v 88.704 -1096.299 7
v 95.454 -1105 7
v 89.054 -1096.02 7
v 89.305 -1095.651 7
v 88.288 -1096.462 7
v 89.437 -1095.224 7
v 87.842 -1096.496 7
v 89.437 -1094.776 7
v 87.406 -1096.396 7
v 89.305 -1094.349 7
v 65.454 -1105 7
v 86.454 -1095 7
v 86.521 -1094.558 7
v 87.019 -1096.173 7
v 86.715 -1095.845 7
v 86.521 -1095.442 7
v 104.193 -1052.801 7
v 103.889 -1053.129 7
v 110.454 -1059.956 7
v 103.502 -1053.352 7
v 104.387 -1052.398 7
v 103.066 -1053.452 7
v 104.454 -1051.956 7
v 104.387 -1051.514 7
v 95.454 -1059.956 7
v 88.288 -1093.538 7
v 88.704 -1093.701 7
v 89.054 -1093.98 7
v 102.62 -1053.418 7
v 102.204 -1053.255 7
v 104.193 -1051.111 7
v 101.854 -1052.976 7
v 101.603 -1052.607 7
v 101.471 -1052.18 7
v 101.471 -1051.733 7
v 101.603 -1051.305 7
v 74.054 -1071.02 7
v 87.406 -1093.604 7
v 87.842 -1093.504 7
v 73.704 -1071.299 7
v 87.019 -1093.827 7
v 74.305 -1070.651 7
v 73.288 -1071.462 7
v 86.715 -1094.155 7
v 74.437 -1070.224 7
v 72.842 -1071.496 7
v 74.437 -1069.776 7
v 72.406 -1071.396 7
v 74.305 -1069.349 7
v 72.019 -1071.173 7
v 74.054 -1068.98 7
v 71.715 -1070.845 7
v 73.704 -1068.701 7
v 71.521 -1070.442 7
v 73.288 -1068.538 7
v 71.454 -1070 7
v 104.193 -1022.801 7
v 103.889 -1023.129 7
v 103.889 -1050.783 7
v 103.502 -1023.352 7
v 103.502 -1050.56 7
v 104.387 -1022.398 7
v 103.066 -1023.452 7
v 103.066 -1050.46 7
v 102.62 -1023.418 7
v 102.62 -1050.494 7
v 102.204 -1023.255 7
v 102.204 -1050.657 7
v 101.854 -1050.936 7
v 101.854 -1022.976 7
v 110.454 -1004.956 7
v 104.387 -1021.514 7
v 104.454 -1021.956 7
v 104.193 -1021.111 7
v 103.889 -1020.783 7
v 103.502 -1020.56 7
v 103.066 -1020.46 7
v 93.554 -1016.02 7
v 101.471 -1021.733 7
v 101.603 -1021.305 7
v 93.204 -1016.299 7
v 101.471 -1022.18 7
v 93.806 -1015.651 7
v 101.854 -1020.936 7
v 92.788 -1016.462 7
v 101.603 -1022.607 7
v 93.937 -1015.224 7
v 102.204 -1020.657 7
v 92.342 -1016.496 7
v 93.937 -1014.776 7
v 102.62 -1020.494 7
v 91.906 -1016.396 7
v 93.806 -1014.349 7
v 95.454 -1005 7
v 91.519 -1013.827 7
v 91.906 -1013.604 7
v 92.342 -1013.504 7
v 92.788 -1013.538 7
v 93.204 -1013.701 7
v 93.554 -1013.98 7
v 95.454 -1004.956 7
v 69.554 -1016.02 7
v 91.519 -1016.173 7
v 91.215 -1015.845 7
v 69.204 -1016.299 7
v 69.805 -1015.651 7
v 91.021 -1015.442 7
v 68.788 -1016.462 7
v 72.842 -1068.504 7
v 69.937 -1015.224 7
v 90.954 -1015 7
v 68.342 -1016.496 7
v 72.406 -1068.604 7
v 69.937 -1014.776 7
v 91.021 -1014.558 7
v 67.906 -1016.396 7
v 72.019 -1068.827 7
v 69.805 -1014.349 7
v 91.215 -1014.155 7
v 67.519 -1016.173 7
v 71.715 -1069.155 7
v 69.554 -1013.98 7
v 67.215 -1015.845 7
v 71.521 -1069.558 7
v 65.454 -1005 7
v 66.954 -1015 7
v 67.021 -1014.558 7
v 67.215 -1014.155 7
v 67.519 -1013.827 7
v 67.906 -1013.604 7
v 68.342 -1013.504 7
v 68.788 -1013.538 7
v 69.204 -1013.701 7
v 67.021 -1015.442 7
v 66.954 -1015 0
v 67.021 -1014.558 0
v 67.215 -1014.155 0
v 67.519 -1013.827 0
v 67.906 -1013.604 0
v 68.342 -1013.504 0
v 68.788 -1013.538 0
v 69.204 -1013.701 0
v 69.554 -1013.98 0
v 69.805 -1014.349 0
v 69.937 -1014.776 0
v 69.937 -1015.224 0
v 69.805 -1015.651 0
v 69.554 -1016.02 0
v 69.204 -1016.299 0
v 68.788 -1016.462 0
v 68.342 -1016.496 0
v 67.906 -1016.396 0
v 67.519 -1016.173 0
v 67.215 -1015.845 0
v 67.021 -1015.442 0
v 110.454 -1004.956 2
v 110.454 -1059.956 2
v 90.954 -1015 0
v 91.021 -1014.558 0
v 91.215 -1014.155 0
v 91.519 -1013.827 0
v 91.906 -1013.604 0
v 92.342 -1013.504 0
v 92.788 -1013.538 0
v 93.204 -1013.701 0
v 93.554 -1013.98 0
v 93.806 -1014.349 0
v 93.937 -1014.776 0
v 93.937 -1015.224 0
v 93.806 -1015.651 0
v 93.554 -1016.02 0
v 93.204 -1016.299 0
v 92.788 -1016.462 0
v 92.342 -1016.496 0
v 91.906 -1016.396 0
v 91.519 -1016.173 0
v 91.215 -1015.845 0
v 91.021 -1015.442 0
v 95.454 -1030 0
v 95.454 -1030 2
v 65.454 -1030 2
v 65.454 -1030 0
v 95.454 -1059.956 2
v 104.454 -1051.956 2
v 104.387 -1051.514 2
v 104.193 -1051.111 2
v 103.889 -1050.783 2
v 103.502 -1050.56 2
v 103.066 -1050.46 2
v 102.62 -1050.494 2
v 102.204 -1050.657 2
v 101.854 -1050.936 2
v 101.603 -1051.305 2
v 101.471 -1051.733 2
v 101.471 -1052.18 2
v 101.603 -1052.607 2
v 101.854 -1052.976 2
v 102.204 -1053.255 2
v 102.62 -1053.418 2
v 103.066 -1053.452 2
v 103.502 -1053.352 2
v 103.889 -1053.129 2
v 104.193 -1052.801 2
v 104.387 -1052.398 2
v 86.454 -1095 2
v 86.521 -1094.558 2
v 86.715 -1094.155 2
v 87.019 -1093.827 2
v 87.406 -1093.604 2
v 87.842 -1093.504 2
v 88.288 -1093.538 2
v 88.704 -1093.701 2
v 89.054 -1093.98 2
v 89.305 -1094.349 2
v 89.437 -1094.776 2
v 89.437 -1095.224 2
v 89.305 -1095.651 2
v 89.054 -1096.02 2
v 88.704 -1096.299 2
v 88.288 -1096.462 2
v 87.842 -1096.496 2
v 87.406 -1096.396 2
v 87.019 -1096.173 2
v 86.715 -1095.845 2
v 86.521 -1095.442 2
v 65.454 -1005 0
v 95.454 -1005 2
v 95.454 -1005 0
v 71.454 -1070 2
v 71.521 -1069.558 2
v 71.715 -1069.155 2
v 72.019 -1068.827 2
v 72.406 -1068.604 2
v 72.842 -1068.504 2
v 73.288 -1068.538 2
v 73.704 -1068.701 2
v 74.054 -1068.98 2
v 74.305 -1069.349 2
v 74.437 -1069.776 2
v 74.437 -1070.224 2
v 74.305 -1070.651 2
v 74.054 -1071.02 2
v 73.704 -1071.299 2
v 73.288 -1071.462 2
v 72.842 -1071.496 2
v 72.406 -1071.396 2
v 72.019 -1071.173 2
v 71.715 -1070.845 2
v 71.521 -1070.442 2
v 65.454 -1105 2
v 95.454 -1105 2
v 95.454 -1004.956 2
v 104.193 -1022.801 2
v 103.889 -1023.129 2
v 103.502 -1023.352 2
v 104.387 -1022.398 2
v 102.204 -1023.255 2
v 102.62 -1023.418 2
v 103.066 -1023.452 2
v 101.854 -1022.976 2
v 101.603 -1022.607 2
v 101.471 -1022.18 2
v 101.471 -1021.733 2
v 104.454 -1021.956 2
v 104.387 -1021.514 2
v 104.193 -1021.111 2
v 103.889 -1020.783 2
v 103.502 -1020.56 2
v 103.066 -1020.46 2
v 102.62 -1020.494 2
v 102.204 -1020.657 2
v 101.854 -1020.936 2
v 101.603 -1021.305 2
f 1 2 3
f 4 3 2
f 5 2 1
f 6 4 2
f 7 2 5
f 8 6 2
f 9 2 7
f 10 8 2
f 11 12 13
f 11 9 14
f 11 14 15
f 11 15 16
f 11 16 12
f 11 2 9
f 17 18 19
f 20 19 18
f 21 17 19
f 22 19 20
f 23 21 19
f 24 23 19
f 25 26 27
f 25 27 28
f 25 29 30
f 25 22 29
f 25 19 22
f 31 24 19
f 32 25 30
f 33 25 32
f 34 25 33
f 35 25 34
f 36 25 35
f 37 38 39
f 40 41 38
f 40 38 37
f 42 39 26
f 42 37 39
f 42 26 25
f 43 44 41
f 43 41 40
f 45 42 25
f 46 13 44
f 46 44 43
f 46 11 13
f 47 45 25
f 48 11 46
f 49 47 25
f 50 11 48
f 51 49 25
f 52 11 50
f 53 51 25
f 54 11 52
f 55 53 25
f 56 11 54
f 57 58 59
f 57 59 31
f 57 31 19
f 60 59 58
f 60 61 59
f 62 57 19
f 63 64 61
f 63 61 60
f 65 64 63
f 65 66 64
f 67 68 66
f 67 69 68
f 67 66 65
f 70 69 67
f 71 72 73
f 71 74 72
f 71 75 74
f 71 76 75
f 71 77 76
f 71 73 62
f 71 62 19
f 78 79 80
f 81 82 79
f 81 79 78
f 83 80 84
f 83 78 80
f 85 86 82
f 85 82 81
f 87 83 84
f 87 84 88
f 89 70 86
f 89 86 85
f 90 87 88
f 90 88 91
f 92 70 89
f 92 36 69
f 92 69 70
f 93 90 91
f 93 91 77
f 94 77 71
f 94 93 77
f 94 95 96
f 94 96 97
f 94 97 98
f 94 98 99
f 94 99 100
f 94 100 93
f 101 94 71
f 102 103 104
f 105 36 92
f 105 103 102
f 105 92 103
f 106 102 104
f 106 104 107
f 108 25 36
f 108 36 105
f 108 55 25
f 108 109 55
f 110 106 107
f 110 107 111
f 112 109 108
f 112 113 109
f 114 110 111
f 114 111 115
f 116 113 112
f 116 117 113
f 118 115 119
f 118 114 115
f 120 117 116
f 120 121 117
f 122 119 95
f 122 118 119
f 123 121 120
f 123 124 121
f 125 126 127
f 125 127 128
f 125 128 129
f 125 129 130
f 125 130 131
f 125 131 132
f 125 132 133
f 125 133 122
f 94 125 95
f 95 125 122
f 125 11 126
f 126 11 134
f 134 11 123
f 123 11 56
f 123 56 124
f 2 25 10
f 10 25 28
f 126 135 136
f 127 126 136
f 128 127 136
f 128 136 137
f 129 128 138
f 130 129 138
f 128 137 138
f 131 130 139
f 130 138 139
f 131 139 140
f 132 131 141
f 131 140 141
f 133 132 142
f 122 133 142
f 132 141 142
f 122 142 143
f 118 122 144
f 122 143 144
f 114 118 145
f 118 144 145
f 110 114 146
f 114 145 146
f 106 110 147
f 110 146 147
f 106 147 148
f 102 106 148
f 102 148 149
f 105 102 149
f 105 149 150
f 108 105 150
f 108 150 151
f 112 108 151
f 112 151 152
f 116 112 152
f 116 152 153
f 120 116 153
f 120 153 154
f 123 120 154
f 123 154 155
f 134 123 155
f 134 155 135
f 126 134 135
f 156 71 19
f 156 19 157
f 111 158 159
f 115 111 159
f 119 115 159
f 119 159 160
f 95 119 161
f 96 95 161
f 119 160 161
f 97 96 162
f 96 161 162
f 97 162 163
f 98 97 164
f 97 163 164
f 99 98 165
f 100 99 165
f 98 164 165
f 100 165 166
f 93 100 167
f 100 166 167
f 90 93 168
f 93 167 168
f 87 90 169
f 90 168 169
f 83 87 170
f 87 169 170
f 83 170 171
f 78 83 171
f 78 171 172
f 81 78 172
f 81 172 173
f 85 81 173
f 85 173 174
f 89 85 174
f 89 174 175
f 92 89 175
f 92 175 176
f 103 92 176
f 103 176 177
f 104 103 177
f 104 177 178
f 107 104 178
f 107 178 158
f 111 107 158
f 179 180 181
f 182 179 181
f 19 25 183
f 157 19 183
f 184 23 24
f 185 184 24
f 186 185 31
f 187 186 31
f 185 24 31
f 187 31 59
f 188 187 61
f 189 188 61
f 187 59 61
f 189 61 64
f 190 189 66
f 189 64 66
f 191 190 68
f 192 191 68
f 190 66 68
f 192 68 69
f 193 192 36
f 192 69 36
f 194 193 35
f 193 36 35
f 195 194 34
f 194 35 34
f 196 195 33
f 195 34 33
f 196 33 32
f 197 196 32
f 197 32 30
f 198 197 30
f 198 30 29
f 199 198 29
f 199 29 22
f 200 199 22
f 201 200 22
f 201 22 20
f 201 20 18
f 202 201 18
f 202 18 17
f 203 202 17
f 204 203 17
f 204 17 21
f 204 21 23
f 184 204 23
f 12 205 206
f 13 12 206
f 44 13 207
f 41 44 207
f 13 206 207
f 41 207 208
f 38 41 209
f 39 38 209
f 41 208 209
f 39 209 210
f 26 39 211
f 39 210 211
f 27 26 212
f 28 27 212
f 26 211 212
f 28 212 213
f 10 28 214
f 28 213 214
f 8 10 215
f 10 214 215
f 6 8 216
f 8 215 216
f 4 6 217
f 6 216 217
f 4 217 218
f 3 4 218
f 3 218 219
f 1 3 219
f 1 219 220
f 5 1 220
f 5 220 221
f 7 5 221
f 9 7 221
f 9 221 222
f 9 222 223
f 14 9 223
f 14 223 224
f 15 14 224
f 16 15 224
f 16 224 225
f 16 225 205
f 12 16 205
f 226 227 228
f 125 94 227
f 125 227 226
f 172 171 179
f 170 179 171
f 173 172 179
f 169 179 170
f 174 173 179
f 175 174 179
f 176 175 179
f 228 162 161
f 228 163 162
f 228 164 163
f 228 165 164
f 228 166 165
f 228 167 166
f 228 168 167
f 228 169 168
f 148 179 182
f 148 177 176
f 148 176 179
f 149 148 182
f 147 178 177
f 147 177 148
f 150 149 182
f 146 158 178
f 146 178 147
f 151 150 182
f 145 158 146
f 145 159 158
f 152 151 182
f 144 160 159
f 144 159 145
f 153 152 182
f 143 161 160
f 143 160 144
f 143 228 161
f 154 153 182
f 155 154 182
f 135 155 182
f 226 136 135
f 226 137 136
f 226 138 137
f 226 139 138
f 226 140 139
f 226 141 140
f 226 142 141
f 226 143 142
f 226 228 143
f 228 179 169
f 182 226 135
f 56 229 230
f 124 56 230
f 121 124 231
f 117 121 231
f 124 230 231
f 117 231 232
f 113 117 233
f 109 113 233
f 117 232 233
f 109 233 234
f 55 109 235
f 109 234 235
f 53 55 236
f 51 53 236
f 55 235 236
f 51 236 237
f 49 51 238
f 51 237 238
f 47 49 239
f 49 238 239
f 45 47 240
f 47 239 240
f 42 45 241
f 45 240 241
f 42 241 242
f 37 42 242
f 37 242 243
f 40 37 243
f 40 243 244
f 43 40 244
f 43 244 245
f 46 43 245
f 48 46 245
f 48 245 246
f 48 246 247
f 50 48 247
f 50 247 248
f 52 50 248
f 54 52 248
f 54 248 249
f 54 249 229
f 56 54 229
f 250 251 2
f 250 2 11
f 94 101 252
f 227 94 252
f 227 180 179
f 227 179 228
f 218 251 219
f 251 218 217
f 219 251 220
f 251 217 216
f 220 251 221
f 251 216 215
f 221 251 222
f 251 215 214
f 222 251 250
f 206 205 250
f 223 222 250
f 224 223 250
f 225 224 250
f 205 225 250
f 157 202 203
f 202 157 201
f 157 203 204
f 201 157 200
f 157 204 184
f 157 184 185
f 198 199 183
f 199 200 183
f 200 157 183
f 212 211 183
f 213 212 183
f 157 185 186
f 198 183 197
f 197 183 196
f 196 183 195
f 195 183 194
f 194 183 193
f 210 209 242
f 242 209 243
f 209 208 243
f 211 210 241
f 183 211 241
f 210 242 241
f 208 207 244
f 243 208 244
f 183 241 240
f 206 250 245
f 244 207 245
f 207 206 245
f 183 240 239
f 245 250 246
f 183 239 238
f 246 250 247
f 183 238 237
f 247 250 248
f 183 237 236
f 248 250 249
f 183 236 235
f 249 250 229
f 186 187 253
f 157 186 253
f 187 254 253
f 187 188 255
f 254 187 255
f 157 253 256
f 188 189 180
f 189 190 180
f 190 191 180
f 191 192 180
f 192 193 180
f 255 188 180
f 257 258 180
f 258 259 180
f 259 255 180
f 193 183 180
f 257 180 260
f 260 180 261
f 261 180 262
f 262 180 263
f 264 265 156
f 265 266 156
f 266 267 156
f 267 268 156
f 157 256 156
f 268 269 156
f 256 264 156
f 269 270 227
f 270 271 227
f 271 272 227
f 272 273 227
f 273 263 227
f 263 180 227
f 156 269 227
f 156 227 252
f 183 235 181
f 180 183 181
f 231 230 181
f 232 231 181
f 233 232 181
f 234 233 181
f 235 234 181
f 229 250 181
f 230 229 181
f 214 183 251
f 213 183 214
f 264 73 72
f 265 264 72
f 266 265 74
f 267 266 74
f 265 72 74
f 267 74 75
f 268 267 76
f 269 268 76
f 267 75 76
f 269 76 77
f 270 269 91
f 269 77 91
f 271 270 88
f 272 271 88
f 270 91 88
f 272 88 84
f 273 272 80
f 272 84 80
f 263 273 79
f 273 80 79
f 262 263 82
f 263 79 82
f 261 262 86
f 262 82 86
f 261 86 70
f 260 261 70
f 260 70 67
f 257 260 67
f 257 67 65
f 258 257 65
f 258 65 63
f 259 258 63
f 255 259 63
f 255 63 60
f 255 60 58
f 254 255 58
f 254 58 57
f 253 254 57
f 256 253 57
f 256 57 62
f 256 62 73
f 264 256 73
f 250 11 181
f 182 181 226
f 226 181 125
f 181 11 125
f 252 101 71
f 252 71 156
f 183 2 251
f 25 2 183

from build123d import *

# Parameters (mm, degrees)
SALIENTE_EXTRUIR1_START = 2
SALIENTE_EXTRUIR1_DEPTH = 5
CROQUIS2_W              = 30
CROQUIS2_H              = 25
SALIENTE_EXTRUIR2_DEPTH = 2
CROQUIS3_R              = 1.5
CORTAR_EXTRUIR1_DEPTH   = 10
CROQUIS4_R              = 1.500036904
CROQUIS4_R_2            = 1.5
CORTAR_EXTRUIR2_DEPTH   = 10
CROQUIS6_W              = 5
CROQUIS6_H              = 55
SALIENTE_EXTRUIR3_DEPTH = 15
CROQUIS7_R              = 1.5
CORTAR_EXTRUIR3_DEPTH   = 20


with BuildPart() as part:
    # Croquis1 → Saliente-Extruir1 (new body)
    with BuildSketch(Plane.XY.offset(SALIENTE_EXTRUIR1_START)):
        Polygon((65.454041039, -1015), (65.454041039, -1005), (95.454041039, -1005), (95.454041039, -1015), (95.454041039, -1105), (65.454041039, -1105), align=None)
    extrude(amount=SALIENTE_EXTRUIR1_DEPTH)

    # Croquis2 → Saliente-Extruir2 (add)
    with BuildSketch(Plane(origin=(0, 0, 2), x_dir=(-1, 0, 0), z_dir=(0, 0, -1))):
        with Locations((-80.454041039, -1017.5)):
            Rectangle(CROQUIS2_W, CROQUIS2_H)
    extrude(amount=SALIENTE_EXTRUIR2_DEPTH)

    # Croquis3 → Cortar-Extruir1 (cut)
    with BuildSketch(Plane(origin=(0, 0, 2), x_dir=(-1, 0, 0), z_dir=(0, 0, -1))):
        with Locations((-72.954041039, -1070)):
            Circle(CROQUIS3_R)
        with Locations((-87.954041039, -1095)):
            Circle(CROQUIS3_R)
    extrude(amount=-CORTAR_EXTRUIR1_DEPTH, mode=Mode.SUBTRACT)

    # Croquis4 → Cortar-Extruir2 (cut)
    with BuildSketch(Plane(origin=(0, 0, 0), x_dir=(-1, 0, 0), z_dir=(0, 0, -1))):
        with Locations((-92.454041038, -1014.999963096)):
            Circle(CROQUIS4_R)
        with Locations((-68.454041039, -1015)):
            Circle(CROQUIS4_R_2)
    extrude(amount=-CORTAR_EXTRUIR2_DEPTH, mode=Mode.SUBTRACT)

    # Croquis6 → Saliente-Extruir3 (add)
    with BuildSketch(Plane(origin=(95.454041039, 0, 0), x_dir=(0, 0, -1), z_dir=(1, 0, 0))):
        with Locations((-4.5, -1032.456092312)):
            Rectangle(CROQUIS6_W, CROQUIS6_H)
    extrude(amount=SALIENTE_EXTRUIR3_DEPTH)

    # Croquis7 → Cortar-Extruir3 (cut)
    with BuildSketch(Plane.XY.offset(7)):
        with Locations((102.954041039, -1051.956092312)):
            Circle(CROQUIS7_R)
        with Locations((102.954041039, -1021.956092312)):
            Circle(CROQUIS7_R)
    extrude(amount=-CORTAR_EXTRUIR3_DEPTH, mode=Mode.SUBTRACT)


solid = part.part
